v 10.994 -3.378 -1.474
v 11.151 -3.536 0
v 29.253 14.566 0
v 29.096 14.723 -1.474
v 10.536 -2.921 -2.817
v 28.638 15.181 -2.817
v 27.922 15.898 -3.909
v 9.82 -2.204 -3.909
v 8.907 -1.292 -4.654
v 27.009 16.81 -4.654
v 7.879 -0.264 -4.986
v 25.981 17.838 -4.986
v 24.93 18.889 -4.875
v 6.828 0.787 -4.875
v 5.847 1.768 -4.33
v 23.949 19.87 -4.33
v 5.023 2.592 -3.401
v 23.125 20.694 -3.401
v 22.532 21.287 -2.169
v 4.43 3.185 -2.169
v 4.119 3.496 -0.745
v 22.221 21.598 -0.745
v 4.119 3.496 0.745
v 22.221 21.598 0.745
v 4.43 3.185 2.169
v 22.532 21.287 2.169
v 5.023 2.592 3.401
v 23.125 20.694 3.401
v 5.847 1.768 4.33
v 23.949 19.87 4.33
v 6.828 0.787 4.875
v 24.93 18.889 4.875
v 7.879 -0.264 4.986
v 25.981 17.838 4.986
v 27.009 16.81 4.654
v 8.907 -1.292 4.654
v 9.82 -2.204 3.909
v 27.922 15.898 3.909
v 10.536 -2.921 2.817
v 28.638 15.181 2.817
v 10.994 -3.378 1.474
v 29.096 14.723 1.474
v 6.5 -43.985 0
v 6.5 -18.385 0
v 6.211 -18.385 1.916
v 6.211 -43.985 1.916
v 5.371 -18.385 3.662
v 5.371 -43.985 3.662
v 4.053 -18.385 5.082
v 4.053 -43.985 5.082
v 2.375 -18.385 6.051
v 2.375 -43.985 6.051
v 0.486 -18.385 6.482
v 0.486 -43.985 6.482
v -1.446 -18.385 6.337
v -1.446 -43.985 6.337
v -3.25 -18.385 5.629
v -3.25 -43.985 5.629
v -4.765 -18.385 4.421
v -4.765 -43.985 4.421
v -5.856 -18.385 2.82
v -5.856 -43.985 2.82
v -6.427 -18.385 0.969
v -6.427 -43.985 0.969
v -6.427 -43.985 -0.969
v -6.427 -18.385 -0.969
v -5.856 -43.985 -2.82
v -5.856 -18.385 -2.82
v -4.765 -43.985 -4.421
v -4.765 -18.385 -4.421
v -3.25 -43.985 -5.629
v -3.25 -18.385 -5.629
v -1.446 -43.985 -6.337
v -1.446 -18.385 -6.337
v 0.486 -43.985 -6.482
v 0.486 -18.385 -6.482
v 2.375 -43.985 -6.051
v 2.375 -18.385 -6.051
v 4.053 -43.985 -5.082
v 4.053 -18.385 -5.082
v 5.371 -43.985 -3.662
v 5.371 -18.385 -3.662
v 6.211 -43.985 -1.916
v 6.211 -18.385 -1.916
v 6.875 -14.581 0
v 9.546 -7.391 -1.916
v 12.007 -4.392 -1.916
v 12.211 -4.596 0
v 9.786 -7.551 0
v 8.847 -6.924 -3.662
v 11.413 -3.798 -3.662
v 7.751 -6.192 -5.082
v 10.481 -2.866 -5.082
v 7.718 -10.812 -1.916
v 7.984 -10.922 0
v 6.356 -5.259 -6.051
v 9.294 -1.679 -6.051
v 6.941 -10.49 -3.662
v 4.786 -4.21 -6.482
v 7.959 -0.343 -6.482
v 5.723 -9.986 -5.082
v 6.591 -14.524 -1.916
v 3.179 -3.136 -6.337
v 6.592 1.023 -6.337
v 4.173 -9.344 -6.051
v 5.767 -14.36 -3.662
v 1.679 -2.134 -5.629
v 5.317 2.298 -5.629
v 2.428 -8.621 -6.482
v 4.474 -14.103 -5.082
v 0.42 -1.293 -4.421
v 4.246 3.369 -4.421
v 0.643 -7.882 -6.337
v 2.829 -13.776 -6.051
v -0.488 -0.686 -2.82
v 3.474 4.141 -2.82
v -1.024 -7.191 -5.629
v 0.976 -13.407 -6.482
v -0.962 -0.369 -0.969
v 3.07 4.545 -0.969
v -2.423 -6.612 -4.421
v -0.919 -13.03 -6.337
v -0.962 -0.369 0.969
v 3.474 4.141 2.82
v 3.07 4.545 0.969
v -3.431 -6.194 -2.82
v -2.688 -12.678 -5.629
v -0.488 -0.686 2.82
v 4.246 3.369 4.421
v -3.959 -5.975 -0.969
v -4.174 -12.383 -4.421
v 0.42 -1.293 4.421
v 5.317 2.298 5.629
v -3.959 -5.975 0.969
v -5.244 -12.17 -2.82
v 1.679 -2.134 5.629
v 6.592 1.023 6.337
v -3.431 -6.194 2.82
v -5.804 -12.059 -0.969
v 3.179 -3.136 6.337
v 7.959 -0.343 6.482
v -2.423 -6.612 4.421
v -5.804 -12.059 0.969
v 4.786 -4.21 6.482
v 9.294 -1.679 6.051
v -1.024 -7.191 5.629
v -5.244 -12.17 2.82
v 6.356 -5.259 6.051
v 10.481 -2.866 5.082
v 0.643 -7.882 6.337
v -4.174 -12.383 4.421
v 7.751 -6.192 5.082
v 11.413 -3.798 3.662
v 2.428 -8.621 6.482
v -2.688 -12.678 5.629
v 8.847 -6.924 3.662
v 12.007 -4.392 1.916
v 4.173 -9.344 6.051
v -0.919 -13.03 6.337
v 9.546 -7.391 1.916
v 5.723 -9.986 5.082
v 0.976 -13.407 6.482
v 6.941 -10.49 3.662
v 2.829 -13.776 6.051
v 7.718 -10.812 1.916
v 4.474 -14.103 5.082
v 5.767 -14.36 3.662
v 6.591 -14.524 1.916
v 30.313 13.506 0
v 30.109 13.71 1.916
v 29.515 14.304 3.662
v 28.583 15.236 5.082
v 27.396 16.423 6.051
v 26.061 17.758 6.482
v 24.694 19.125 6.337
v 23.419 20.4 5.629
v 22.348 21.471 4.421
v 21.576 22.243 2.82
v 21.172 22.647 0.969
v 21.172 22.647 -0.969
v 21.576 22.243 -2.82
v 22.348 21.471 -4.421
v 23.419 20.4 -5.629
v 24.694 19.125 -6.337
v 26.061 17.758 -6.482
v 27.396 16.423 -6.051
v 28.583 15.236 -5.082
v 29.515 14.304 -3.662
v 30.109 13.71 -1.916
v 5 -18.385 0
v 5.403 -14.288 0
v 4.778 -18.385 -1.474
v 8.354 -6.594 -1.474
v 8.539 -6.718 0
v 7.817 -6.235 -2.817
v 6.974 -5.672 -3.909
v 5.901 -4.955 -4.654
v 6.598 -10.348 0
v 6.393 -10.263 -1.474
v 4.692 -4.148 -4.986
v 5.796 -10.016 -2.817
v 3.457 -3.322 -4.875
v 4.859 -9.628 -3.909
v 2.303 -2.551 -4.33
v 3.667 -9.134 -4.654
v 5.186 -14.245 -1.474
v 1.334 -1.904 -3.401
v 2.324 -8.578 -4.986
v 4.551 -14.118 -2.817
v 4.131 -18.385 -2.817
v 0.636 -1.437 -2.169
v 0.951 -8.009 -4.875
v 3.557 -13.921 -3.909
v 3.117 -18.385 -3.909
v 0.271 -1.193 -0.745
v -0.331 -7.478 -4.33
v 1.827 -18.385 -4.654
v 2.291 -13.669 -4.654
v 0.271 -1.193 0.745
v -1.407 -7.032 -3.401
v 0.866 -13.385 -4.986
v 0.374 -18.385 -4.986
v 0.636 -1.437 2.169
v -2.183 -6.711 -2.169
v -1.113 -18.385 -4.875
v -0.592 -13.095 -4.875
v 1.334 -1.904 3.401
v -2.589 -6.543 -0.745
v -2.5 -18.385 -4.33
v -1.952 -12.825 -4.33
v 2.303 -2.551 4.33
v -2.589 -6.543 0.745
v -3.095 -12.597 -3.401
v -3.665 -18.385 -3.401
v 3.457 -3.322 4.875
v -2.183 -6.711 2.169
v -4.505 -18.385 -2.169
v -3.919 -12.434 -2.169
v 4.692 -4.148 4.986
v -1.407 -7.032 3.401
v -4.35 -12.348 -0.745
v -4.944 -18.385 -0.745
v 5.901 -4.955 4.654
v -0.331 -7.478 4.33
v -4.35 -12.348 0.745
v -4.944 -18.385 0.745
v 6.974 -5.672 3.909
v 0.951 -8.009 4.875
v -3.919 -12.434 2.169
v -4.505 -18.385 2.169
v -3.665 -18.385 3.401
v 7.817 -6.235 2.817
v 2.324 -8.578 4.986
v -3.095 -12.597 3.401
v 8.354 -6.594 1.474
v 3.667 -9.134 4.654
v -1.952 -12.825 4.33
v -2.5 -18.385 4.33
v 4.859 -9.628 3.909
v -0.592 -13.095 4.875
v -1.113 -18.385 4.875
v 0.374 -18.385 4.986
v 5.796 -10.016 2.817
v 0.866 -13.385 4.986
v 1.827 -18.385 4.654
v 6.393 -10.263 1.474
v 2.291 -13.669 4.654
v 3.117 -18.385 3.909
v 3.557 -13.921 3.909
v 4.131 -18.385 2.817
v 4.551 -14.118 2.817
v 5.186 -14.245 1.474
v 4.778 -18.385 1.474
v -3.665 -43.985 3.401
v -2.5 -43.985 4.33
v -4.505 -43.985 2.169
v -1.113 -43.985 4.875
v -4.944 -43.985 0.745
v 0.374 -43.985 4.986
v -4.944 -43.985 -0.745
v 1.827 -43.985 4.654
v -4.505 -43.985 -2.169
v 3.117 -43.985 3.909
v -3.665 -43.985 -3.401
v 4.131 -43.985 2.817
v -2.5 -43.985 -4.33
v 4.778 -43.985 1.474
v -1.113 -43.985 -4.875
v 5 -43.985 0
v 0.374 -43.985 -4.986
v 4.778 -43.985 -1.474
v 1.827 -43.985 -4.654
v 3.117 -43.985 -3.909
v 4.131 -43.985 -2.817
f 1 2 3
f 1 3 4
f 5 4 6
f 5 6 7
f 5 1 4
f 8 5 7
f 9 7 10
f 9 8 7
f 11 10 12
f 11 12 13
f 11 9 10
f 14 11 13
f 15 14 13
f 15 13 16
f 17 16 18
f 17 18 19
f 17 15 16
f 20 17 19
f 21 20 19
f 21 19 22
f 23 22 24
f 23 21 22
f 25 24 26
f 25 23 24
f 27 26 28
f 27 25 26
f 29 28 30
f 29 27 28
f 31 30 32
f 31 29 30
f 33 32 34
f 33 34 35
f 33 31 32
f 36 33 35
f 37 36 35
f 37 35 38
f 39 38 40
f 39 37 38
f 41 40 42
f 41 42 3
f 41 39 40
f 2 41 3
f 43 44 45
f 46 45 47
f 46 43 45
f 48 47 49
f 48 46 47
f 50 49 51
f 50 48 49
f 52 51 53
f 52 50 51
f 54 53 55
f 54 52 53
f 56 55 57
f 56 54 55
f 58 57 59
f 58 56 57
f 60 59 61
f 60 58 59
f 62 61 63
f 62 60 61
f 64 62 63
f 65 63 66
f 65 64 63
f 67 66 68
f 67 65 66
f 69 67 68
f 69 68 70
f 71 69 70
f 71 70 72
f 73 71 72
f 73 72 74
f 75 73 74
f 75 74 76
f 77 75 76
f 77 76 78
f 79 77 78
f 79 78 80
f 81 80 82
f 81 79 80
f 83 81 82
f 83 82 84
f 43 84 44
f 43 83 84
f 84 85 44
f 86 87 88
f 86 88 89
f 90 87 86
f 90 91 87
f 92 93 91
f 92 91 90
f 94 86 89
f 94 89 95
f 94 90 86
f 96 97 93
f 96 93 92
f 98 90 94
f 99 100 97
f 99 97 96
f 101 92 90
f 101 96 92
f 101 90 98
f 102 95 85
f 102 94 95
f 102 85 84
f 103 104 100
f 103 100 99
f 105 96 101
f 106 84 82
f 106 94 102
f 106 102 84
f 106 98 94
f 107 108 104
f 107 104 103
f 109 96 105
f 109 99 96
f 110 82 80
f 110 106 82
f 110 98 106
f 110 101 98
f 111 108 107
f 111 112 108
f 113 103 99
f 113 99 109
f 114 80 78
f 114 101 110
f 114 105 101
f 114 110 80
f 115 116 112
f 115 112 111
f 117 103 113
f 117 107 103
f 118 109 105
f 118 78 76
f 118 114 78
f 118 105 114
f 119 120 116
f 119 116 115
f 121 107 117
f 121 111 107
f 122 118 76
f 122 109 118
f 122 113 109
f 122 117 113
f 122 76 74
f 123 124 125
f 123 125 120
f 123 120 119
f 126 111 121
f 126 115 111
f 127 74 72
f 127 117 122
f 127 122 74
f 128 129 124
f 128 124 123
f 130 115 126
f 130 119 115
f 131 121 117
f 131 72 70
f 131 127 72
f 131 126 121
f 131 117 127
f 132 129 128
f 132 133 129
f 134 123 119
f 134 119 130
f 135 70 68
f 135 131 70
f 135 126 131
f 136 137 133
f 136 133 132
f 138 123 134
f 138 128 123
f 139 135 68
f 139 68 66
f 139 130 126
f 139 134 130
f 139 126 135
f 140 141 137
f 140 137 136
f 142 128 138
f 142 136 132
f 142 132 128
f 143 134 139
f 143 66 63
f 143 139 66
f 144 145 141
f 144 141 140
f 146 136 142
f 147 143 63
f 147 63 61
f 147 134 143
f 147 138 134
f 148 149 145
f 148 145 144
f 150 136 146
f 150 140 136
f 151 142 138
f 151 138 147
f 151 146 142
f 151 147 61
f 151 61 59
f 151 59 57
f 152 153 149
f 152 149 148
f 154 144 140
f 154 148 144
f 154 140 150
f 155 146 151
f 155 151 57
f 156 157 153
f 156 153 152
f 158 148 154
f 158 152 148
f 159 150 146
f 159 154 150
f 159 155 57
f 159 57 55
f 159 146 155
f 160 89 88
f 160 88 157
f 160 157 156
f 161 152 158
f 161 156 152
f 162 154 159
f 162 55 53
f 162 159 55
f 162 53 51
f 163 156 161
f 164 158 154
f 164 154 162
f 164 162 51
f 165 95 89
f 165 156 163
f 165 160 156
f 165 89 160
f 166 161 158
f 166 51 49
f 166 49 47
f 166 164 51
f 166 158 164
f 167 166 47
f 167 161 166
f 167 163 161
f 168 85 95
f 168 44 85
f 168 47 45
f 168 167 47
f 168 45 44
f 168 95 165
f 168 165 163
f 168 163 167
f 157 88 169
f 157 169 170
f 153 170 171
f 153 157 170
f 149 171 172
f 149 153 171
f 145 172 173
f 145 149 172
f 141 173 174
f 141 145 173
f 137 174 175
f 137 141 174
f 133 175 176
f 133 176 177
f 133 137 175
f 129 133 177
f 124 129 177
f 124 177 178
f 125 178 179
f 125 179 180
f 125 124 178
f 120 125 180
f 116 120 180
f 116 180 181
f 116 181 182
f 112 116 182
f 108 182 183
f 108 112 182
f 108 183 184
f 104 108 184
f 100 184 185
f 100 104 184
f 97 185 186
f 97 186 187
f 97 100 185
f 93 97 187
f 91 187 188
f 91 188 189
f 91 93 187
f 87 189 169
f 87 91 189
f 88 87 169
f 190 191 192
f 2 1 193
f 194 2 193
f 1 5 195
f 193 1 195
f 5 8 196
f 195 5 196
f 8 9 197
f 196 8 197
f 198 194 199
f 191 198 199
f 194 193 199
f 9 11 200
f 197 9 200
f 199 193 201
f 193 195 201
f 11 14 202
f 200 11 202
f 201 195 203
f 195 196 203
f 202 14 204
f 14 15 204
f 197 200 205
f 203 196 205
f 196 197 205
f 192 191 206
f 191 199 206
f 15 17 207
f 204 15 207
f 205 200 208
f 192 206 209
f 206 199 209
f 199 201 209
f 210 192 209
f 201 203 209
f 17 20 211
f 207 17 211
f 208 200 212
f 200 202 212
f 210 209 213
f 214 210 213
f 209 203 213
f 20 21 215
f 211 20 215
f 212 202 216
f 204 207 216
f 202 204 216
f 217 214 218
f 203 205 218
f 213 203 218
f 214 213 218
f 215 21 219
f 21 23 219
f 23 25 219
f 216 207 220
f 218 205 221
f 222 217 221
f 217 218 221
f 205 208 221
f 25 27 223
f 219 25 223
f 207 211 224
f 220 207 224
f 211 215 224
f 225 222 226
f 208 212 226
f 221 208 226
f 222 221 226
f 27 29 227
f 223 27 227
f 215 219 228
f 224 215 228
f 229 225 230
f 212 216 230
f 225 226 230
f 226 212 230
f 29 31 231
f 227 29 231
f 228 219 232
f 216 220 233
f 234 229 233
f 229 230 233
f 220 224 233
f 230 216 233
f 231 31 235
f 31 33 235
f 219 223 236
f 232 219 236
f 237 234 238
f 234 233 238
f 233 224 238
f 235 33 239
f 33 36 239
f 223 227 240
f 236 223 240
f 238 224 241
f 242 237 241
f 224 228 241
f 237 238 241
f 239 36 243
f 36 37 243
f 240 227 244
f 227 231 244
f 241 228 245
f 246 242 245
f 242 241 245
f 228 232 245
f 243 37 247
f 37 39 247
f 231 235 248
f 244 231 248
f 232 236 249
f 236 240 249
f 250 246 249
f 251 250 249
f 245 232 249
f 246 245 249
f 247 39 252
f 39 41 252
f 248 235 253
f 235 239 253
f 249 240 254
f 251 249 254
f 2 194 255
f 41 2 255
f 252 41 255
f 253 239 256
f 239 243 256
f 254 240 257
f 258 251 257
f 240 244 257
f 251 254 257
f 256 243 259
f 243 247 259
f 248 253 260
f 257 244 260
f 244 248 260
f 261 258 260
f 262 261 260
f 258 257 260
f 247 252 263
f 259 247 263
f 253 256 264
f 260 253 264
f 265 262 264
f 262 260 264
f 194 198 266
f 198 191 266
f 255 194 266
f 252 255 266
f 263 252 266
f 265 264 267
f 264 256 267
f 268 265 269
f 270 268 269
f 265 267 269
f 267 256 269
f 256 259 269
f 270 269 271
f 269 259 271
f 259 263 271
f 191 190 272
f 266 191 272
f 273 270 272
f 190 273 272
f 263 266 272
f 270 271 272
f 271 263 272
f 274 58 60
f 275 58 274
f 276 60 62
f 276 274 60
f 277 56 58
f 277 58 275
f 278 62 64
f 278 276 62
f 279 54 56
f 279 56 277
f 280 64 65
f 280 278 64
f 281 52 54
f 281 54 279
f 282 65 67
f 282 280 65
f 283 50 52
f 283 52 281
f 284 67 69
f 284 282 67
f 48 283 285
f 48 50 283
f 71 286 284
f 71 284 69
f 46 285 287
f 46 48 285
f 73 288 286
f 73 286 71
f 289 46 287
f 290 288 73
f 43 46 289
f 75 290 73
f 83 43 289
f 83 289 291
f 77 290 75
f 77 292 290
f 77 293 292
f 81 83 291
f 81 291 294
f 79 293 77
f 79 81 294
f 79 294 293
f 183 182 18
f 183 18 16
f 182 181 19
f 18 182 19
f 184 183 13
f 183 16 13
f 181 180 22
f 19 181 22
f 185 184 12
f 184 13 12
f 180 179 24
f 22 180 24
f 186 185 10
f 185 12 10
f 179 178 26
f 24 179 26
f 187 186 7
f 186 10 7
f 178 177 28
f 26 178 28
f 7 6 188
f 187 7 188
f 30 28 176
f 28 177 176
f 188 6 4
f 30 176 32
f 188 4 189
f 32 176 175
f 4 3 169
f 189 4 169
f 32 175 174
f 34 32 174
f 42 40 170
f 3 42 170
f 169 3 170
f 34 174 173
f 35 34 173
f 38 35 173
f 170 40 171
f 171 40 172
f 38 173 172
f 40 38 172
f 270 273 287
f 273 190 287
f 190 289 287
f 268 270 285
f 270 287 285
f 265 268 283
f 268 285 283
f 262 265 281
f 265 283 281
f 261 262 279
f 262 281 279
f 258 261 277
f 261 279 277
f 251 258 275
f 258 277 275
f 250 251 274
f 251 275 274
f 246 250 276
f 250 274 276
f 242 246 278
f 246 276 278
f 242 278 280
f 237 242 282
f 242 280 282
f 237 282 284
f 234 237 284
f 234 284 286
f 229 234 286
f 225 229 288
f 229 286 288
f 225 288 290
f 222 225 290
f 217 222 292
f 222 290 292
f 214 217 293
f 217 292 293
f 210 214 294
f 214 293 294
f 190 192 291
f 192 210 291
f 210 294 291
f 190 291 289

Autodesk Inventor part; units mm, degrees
ref_plane "YZ Plane" through (0, 0, 0) normal (1, 0, 0) x (0, 1, 0)
ref_plane "XZ Plane" through (0, 0, 0) normal (0, 1, 0) x (-1, 0, 0)
sketch "Szkic6" plane through (0, 0, 0) normal (0, 0, 1) x (1, 0, 0)
  line L0 (-29.6067, 0) -> (35.2678, 0) construction
  line L1 (0, 42.3419) -> (0, -58.3726) construction
  arc A0 (7.6152, 0) -> (0, -18.3848) centre (26, -18.3848) ccw
  line L2 (0, -18.3848) -> (26, -18.3848) construction
  line L3 (26, -18.3848) -> (-20.3389, 27.9541) construction
  line L4 (7.6152, 0) -> (25.7172, 18.1019)
  line L5 (0, -18.3848) -> (0, -43.9848)
  point P0 (0, 0)
  dimension "d24" = 55
  dimension "d31" = 45
  dimension "d36" = 0
  dimension "d37" = 0
ref_plane "Płaszczyzna konstrukcyjna2" through (0, -18.3848, 0) normal (0, -1, 0) x (1, 0, 0)
sketch "Szkic8" plane through (0, -18.3848, 0) normal (0, -1, 0) x (1, 0, 0)
  circle A0 centre (0, 0) radius 6.5
  circle A1 centre (0, 0) radius 5
  dimension "d32" = 34
  dimension "d33" = 1.5
sweep "Przeciągnięcie2" add profiles "Szkic8" path "Szkic6"
equation "\"d32\" = OD"
equation "\"d33\" = THK"
equation "\"d24\" = R"
equation "\"d31\" = KAT"
equation "\"SzerokośćGięciaPodcięcia\" = Grubość"
equation "\"RozmiarPodcięciaNarożnika\" = 4 * Grubość"
equation "\"PromieńPrzejścia\" = PromieńGięcia"
equation "\"Rozmiar_promienia_Jacobiego\" = PromieńGięcia"
equation "\"Wielk_odstępu\" = Grubość"
equation "\"d2\" = PromieńGięcia"
equation "\"d23\" = PromieńGięcia"
equation "\"R\" = 55"
equation "\"OD\" = 34"
equation "\"THK\" = 1.5"
equation "\"KAT\" = 45deg"
equation "\"PROSTKA\" = 0"
equation "\"Grubość\" = 1.5"
equation "\"PromieńGięcia\" = 3"
properties part number "Kolano 45° ø34x1,5 R55" material "304L"
